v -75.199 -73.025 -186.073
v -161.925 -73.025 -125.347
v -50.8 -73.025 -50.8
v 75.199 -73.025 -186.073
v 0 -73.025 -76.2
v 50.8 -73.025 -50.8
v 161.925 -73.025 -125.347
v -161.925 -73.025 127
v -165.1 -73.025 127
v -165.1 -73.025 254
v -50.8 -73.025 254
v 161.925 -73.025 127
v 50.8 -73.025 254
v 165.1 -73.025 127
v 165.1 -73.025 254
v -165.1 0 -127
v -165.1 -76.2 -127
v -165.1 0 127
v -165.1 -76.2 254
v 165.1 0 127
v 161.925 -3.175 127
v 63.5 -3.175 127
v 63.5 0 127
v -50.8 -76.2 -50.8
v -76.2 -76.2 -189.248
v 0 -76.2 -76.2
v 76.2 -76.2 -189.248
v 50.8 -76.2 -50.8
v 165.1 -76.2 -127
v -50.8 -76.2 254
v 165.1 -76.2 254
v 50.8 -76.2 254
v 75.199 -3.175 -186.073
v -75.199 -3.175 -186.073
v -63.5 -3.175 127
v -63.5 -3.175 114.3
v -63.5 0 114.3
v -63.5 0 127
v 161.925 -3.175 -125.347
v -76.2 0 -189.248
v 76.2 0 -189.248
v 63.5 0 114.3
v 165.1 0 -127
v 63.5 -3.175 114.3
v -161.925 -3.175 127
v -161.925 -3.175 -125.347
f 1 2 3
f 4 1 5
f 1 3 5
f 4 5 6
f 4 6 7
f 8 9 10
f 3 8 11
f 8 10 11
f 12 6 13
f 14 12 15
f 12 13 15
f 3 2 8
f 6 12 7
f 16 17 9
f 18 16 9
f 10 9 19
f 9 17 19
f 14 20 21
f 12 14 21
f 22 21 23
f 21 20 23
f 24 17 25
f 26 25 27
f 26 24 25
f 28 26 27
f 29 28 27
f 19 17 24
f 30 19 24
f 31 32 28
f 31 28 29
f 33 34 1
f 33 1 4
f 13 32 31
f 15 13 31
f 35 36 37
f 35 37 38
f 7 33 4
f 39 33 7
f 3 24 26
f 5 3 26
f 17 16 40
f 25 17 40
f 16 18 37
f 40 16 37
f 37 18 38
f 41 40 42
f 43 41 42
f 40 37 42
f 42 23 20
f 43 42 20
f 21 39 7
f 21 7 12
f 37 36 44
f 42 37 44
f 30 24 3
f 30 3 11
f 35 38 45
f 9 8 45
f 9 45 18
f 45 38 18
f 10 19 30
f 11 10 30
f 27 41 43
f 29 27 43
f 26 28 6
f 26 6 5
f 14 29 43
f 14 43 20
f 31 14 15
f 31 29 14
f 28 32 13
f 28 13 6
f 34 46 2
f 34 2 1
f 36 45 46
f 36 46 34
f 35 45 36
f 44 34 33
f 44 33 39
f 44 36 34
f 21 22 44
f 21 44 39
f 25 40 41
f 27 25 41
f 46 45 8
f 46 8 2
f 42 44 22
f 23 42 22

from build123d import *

# Parameters (mm, degrees)
F1_DEPTH  = 76.2
F2_T      = -3.175
F4_DEPTH  = 25.4
F5_W      = 127
F5_H      = 25.4
F6_DEPTH  = 25.4
F7_W      = 330.2
F7_H      = 127
F8_DEPTH  = 3.175
F9_W      = 101.6
F9_H      = 127
F10_DEPTH = 25.4


# Not quite as in the source:
# - a pattern or mirror of a feature is missing from the dataset's text; its kind, count and spacing are read off the source's solid


with BuildPart() as f1:
    # F0 (on Front) → F1 (new body)
    with BuildSketch(Plane.XZ):
        with BuildLine():
            ThreePointArc((-1.539e-07, -127), (89.8025611563, -89.8025612651), (127, 0))
            ThreePointArc((127, 0), (89.8025612186, 89.8025612028), (2.24e-08, 127))
            ThreePointArc((2.24e-08, 127), (-127, 8.82e-08), (-1.539e-07, -127))
        make_face()
        with BuildLine():
            ThreePointArc((2.24e-08, 127), (89.8025612186, 89.8025612028), (127, 0))
            ThreePointArc((127, 0), (89.8025611563, -89.8025612651), (-1.539e-07, -127))
            Line((-1.539e-07, -127), (165.1, -127))
            Line((165.1, -127), (165.1, 127))
            Line((165.1, 127), (2.24e-08, 127))
        make_face()
        with BuildLine():
            ThreePointArc((-1.539e-07, -127), (-127, 8.82e-08), (2.24e-08, 127))
            Line((2.24e-08, 127), (-165.1, 127))
            Line((-165.1, 127), (-165.1, -127))
            Line((-165.1, -127), (-1.539e-07, -127))
        make_face()
        Polygon((165.1, -127), (-1.539e-07, -127), (-165.1, -127), (-76.2, -189.2484501468), (76.2, -189.2484501468), align=None)
    extrude(amount=F1_DEPTH)

    # F2
    f2_openings = [f1.faces().sort_by_distance(p)[0] for p in [
        (0, -38.1, 127),
    ]]
    offset(amount=F2_T, openings=f2_openings)

    # F3 (on face) → F4 (cut)
    with BuildSketch(Plane.XZ.offset(76.2)):
        Polygon((0, -76.2), (0, 127), (-50.8, 127), (-50.8, -50.8), align=None)
    f4 = extrude(amount=-F4_DEPTH, mode=Mode.SUBTRACT)

    # F4_copies: F4 across plane
    add(f4.mirror(Plane(origin=(0, 0, 0), x_dir=(0, 0, 1), z_dir=(1, 0, 0))), mode=Mode.SUBTRACT)

    # F5 (on face) → F6 (cut)
    with BuildSketch(Plane.XZ.offset(3.175)):
        with Locations((0, 127)):
            Rectangle(F5_W, F5_H)
    extrude(amount=-F6_DEPTH, mode=Mode.SUBTRACT)

    # F7 (on face) → F8 (join)
    with BuildSketch(Plane.XZ.offset(76.2)):
        with Locations((0, 190.5)):
            Rectangle(F7_W, F7_H)
    extrude(amount=-F8_DEPTH)

    # F9 (on face) → F10 (cut)
    with BuildSketch(Plane.XZ.offset(76.2)):
        with Locations((0, 190.5)):
            Rectangle(F9_W, F9_H)
    extrude(amount=-F10_DEPTH, mode=Mode.SUBTRACT)


solid = f1.part
